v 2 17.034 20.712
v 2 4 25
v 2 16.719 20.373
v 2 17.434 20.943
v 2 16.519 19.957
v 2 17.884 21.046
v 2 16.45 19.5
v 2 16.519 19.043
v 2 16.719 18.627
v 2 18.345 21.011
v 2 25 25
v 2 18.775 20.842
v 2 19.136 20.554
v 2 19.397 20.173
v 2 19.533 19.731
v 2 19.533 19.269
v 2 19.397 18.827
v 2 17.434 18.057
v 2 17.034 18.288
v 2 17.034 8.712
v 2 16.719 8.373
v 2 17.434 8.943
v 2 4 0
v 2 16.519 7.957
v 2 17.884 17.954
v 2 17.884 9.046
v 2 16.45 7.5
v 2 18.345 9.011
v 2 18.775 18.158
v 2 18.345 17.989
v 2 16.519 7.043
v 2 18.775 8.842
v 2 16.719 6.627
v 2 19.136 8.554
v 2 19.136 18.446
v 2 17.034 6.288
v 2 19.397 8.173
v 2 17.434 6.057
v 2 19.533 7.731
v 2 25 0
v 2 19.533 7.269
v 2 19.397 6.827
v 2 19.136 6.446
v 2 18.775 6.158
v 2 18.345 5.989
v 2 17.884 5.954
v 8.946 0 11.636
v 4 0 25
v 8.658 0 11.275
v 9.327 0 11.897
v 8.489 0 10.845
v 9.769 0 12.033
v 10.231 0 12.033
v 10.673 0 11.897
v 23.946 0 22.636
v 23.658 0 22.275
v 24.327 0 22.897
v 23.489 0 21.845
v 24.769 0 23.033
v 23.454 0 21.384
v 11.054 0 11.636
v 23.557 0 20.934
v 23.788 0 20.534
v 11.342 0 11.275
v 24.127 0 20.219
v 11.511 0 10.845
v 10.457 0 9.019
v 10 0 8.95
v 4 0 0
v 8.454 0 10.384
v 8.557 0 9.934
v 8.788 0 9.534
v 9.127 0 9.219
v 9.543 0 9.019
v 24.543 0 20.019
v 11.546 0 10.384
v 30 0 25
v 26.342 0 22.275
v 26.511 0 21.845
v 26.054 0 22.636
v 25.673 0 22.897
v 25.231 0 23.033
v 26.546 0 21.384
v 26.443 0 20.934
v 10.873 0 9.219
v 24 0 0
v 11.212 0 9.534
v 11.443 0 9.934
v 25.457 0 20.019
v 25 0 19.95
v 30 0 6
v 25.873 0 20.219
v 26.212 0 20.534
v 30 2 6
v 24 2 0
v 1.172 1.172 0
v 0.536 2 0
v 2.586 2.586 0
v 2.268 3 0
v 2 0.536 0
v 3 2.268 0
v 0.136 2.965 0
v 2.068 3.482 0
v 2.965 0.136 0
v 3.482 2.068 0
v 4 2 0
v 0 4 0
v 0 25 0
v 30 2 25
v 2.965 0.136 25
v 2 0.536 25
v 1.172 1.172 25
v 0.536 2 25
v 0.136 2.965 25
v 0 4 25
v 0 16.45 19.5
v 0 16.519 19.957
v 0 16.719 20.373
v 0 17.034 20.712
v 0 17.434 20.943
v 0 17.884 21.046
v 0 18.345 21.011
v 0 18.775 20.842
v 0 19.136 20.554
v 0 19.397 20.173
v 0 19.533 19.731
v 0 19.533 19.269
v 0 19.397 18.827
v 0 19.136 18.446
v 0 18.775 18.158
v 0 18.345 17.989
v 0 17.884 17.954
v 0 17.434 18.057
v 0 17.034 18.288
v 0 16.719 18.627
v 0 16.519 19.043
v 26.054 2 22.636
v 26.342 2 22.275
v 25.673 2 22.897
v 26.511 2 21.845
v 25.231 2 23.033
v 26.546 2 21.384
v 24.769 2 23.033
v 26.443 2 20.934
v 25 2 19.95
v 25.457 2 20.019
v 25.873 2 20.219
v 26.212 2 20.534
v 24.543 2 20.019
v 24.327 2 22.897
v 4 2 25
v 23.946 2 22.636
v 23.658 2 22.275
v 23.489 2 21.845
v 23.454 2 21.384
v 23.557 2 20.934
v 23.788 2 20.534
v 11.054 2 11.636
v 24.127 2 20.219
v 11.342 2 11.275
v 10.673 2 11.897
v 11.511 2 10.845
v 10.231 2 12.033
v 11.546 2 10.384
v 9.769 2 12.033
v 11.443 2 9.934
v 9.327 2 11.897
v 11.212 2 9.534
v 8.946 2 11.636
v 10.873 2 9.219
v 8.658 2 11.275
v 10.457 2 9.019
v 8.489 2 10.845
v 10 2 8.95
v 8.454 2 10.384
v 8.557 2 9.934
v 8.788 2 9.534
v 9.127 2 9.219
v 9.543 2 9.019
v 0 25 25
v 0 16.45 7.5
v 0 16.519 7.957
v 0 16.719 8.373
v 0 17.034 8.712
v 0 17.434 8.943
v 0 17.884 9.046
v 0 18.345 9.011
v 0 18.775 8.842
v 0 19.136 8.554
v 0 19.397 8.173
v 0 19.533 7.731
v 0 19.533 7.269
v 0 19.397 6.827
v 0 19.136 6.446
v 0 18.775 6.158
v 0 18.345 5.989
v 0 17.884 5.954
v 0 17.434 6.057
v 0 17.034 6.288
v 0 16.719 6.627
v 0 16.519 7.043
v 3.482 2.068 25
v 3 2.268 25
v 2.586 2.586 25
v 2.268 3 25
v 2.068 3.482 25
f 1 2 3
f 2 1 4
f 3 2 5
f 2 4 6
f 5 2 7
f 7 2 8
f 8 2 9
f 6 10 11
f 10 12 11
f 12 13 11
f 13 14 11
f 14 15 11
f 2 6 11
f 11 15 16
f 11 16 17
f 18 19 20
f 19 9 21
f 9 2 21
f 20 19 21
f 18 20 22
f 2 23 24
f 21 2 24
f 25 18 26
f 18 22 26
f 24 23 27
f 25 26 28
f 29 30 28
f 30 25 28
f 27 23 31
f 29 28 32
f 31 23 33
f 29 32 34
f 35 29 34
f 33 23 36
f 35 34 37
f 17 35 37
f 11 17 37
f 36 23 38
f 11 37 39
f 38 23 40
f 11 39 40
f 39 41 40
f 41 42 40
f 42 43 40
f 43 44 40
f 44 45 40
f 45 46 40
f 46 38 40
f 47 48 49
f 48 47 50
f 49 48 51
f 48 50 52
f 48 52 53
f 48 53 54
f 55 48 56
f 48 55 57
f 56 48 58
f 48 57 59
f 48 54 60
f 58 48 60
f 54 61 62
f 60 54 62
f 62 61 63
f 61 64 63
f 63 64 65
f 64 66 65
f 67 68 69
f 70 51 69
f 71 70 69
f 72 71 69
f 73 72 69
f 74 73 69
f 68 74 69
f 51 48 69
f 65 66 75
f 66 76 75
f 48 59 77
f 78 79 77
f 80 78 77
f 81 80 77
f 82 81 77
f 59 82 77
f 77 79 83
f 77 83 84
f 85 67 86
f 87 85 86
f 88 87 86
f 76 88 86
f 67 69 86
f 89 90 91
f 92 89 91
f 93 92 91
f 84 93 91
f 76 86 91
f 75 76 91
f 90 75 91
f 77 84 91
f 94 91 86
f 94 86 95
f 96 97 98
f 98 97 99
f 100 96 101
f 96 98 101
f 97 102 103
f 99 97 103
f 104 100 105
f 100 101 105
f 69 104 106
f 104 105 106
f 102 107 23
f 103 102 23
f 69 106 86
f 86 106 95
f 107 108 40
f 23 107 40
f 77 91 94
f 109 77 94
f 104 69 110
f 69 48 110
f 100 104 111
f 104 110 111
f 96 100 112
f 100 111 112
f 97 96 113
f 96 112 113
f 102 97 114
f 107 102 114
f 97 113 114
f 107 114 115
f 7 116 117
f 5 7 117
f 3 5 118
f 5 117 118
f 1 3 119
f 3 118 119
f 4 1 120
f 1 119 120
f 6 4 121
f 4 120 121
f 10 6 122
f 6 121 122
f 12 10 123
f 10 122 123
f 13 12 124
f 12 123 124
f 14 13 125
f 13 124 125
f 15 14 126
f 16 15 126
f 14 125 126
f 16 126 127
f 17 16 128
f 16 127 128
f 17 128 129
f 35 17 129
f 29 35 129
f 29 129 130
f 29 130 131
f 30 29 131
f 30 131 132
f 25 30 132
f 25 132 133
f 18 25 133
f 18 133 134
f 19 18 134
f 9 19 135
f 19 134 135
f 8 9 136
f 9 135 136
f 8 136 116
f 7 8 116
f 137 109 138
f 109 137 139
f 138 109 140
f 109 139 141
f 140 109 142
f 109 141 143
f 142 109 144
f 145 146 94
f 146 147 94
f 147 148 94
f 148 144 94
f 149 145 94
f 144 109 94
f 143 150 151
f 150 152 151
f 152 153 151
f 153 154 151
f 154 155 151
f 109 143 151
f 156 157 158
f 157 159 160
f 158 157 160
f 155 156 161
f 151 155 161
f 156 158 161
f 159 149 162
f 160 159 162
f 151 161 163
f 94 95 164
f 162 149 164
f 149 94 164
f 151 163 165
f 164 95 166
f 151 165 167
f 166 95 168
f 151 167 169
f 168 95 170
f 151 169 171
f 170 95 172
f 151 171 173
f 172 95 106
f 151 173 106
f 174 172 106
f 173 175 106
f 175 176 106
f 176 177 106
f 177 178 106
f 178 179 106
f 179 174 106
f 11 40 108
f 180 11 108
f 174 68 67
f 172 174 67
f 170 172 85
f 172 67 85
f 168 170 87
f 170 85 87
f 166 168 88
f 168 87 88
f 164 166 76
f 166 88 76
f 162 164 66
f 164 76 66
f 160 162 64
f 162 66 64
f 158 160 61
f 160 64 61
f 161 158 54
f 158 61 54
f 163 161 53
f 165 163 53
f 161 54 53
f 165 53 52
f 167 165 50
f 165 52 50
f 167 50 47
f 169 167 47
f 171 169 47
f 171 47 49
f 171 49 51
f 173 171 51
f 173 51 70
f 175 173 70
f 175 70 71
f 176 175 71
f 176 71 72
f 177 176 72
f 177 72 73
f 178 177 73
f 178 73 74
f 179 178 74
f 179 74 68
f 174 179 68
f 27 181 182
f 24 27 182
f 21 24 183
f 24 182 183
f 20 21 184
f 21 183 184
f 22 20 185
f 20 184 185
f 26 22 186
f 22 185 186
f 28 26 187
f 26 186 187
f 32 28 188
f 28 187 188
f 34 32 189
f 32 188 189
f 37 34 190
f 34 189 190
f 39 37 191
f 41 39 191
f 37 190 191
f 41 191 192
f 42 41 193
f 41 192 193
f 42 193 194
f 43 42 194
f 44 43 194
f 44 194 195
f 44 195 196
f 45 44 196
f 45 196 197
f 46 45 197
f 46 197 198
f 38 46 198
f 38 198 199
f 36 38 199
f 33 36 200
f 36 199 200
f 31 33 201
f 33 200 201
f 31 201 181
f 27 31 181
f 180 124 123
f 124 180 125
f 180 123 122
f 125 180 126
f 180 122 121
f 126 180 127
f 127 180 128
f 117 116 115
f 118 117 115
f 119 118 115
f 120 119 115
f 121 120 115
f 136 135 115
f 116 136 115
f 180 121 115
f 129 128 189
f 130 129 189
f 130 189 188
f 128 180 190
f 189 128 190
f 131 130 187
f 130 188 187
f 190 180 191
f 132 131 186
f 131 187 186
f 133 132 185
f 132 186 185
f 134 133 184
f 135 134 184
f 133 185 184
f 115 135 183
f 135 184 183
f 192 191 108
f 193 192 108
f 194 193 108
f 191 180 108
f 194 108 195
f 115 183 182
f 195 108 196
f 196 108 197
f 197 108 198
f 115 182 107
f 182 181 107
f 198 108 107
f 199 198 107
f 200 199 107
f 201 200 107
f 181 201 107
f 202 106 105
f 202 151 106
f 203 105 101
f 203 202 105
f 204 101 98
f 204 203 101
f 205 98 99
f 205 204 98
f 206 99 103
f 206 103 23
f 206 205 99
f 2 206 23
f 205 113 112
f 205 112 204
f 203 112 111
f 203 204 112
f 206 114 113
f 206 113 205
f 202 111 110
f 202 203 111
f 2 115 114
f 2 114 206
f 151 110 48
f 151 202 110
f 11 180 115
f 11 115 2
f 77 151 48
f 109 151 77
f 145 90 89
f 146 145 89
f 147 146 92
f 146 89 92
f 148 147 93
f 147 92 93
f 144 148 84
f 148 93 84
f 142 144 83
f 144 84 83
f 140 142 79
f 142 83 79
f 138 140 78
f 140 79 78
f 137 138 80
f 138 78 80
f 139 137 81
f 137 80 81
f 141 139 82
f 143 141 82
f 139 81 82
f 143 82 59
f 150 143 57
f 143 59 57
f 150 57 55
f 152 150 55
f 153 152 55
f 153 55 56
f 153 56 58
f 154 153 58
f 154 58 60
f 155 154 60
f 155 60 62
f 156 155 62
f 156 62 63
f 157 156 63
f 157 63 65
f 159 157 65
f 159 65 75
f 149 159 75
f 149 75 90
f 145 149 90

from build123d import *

# Parameters (mm, degrees)
BASE_DEPTH         = 25
SKETCH2_R          = 1.55
CUT_EXTRUDE1_DEPTH = 2
SKETCH4_R          = 1.55
CUT_EXTRUDE3_DEPTH = 47.368092477
CHAMFER2_SIZE      = 6
FILLET1_R          = 2
FILLET2_R          = 4


with BuildPart() as part:
    # Sketch1 → Base (new body)
    with BuildSketch(Plane.XY):
        Polygon((0, 0), (30, 0), (30, 2), (2, 2), (2, 25), (0, 25), align=None)
    extrude(amount=BASE_DEPTH)

    # Sketch2 → Cut-Extrude1 (cut)
    with BuildSketch(Plane.ZY):
        with Locations(Location((19.5, 18, 0), (0, 0, 270))):
            Circle(SKETCH2_R)
        with Locations(Location((7.5, 18, 0), (0, 0, 270))):
            Circle(SKETCH2_R)
    extrude(amount=-CUT_EXTRUDE1_DEPTH, mode=Mode.SUBTRACT)

    # Sketch4 → Cut-Extrude3 (cut, through all)
    with BuildSketch(Plane.XZ):
        with Locations(Location((10, 10.5, 0), (0, 0, 270))):
            Circle(SKETCH4_R)
        with Locations(Location((25, 21.5, 0), (0, 0, 270))):
            Circle(SKETCH4_R)
    extrude(amount=-CUT_EXTRUDE3_DEPTH, mode=Mode.SUBTRACT)

    # Chamfer2
    chamfer2_edges = [part.edges().sort_by_distance(p)[0] for p in [
        (30, 1, 0),
    ]]
    chamfer(chamfer2_edges, length=CHAMFER2_SIZE)

    # Fillet1
    fillet1_edges = [part.edges().sort_by_distance(p)[0] for p in [
        (2, 2, 12.5),
    ]]
    fillet(fillet1_edges, radius=FILLET1_R)

    # Fillet2
    fillet2_edges = [part.edges().sort_by_distance(p)[0] for p in [
        (0, 0, 12.5),
    ]]
    fillet(fillet2_edges, radius=FILLET2_R)


solid = part.part
